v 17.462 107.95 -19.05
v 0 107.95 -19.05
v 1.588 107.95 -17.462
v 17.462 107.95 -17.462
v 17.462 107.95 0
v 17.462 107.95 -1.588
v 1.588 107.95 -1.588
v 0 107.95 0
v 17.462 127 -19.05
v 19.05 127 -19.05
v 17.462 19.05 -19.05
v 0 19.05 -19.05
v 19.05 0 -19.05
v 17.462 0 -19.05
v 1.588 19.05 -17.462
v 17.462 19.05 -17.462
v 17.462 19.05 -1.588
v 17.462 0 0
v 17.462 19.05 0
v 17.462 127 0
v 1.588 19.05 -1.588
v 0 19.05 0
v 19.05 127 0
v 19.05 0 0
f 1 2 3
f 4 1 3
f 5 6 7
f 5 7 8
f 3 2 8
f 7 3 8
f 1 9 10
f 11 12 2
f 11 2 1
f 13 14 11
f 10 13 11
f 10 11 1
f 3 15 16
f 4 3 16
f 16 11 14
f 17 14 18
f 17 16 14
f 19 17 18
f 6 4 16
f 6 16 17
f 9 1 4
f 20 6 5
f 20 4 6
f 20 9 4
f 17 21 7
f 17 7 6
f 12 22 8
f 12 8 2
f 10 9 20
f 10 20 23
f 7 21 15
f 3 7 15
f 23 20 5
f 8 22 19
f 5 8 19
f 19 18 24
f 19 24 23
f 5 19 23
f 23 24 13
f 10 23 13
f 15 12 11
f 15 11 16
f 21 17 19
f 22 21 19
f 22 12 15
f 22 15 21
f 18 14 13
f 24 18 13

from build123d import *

# Parameters (mm, degrees)
SKETCH1_W           = 19.05
SKETCH1_H           = 19.05
SKETCH1_W_2         = 15.875
SKETCH1_H_2         = 15.875
EXTRUDE_THIN1_DEPTH = 127
SKETCH2_W           = 19.05
SKETCH2_H           = 19.05
CUT_EXTRUDE1_DEPTH  = 17.4625
SKETCH3_W           = 19.05
SKETCH3_H           = 19.05
CUT_EXTRUDE2_DEPTH  = 17.4625


with BuildPart() as part:
    # Sketch1 → Extrude-Thin1 (new body)
    with BuildSketch(Plane(origin=(0, 0, 0), x_dir=(1, 0, 0), z_dir=(0, 1, 0))):
        with Locations((9.525, 9.525)):
            Rectangle(SKETCH1_W, SKETCH1_H)
        with Locations((9.525, 9.525)):
            Rectangle(SKETCH1_W_2, SKETCH1_H_2, mode=Mode.SUBTRACT)
    extrude(amount=EXTRUDE_THIN1_DEPTH)

    # Sketch2 → Cut-Extrude1 (cut)
    with BuildSketch(Plane.ZY):
        with Locations((-9.525, 9.525)):
            Rectangle(SKETCH2_W, SKETCH2_H)
    extrude(amount=-CUT_EXTRUDE1_DEPTH, mode=Mode.SUBTRACT)

    # Sketch3 → Cut-Extrude2 (cut)
    with BuildSketch(Plane.ZY):
        with Locations((-9.525, 117.475)):
            Rectangle(SKETCH3_W, SKETCH3_H)
    extrude(amount=-CUT_EXTRUDE2_DEPTH, mode=Mode.SUBTRACT)


solid = part.part
